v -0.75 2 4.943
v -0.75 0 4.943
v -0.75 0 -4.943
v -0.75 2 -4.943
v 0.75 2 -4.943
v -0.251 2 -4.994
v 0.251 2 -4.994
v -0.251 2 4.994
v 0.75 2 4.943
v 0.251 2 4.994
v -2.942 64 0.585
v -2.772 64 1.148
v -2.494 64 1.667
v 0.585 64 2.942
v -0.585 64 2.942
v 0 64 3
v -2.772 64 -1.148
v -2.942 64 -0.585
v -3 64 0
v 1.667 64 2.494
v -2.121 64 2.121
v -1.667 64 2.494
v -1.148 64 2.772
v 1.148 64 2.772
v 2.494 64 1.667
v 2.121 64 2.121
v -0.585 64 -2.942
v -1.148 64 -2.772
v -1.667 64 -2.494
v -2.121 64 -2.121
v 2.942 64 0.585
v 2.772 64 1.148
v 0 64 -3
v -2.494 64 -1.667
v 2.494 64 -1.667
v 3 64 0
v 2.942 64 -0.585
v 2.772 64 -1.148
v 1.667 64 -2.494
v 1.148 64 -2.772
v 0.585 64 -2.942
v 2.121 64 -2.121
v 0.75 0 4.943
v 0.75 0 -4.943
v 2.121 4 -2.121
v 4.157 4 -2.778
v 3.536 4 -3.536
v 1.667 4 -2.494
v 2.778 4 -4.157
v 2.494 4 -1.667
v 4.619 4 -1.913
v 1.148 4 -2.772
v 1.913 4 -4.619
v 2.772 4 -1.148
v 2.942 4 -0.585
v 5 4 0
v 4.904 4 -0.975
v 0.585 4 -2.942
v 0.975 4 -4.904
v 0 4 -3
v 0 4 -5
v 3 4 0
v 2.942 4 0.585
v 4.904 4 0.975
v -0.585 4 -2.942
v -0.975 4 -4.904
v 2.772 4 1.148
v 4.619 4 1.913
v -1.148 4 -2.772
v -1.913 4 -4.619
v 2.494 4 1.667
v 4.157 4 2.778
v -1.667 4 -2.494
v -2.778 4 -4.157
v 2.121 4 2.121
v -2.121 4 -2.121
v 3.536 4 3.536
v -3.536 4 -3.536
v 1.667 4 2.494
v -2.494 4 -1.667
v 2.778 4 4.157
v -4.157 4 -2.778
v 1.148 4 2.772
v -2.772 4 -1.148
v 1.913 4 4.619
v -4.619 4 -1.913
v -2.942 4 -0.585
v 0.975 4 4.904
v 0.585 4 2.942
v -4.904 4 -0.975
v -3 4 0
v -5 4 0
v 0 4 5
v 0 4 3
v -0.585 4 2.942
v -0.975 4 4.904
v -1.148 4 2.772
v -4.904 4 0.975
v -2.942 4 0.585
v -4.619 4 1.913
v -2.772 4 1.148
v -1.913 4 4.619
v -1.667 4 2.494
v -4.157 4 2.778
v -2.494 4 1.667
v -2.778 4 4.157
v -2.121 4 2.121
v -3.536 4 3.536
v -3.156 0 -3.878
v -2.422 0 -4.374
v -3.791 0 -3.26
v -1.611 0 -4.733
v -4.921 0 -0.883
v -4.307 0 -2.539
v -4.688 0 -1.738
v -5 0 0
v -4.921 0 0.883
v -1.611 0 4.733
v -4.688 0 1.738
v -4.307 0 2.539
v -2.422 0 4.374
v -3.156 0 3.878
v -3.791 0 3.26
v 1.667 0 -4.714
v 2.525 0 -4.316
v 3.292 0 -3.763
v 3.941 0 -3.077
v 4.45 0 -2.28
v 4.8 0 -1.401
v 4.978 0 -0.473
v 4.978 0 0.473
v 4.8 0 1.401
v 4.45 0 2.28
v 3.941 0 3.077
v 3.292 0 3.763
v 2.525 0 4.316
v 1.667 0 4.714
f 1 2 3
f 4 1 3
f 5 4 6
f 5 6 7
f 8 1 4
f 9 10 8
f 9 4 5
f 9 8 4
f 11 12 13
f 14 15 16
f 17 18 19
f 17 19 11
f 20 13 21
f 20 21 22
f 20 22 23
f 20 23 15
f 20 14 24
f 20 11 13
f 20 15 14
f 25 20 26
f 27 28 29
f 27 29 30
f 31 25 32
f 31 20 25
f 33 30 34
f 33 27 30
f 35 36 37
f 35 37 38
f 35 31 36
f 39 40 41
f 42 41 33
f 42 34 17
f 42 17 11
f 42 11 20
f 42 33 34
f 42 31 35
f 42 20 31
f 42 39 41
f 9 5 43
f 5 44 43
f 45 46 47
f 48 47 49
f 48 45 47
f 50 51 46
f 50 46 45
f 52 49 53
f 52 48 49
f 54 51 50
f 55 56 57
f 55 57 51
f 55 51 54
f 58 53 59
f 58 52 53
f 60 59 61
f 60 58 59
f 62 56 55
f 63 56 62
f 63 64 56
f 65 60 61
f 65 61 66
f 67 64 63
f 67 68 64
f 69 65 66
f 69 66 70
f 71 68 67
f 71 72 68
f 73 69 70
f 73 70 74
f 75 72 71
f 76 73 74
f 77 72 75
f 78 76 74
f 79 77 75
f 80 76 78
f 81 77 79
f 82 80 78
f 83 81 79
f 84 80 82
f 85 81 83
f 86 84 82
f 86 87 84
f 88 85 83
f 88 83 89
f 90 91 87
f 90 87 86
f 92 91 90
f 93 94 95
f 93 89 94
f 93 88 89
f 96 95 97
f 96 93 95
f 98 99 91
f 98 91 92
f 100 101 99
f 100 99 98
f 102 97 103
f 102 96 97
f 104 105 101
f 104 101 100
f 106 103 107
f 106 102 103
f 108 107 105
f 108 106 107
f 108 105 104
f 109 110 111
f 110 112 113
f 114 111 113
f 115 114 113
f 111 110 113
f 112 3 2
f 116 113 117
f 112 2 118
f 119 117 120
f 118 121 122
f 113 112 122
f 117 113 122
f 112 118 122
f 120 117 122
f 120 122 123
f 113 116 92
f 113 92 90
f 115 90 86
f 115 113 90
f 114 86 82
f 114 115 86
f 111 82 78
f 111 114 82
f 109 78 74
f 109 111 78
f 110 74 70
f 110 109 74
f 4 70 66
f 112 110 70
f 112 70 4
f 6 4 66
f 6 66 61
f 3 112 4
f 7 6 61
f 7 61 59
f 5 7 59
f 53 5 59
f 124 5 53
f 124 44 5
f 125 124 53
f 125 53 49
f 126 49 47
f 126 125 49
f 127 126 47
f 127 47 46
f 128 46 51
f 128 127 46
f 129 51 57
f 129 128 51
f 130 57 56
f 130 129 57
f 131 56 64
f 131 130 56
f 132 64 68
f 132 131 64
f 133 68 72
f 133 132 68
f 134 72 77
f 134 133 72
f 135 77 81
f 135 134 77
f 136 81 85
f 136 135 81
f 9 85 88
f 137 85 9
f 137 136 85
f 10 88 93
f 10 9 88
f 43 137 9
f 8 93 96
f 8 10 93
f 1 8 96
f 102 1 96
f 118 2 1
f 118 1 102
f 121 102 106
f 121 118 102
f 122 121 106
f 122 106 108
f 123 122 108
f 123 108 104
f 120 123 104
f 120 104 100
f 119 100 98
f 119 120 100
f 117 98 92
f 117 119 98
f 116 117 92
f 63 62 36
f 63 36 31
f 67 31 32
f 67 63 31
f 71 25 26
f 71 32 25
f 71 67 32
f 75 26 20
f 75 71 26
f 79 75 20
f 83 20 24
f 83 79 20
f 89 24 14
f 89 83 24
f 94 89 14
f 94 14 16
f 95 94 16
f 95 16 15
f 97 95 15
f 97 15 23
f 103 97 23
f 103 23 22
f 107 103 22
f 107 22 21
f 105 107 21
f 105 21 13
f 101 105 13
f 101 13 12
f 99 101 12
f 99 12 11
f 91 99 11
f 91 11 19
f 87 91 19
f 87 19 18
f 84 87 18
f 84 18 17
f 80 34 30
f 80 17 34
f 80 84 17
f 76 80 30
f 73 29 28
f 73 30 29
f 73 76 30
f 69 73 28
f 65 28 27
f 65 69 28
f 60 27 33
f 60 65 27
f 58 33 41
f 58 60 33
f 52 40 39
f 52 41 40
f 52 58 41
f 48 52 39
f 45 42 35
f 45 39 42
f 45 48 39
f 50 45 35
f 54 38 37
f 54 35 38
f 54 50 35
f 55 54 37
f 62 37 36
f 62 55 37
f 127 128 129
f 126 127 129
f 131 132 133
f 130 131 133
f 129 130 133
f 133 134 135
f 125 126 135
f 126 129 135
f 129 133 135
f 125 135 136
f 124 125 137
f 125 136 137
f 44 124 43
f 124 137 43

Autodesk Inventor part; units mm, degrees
ref_plane "YZ Plane" through (0, 0, 0) normal (1, 0, 0) x (0, 1, 0)
ref_plane "XZ Plane" through (0, 0, 0) normal (0, 1, 0) x (-1, 0, 0)
ref_plane "XY Plane" through (0, 0, 0) normal (0, 0, 1) x (1, 0, 0)
sketch "Sketch1" plane through (0, 0, 0) normal (0, 1, 0) x (-1, 0, 0)
  circle A0 centre (0, 0) radius 5
  dimension "d0" = 10
extrude "Extrusion1" add sketch "Sketch1" along normal blind 4
sketch "Sketch2" plane through (0, 4, 0) normal (0, 1, 0) x (1, 0, 0)
  circle A0 centre (0, 0) radius 3
  dimension "d3" = 6
extrude "Extrusion2" add sketch "Sketch2" along normal blind 60
thread "Thread1" size "M6x1" class "6g" standard "ANSI Metric M Profile" full length
sketch "Sketch3" plane through (0, 0, 0) normal (0, -1, 0) x (1, 0, 0)
  line L0 (-0.75, -10) -> (0.75, -10)
  line L1 (0.75, -10) -> (0.75, 10)
  line L2 (0.75, 10) -> (-0.75, 10)
  line L3 (-0.75, 10) -> (-0.75, -10)
  circle A0 centre (0, 0) radius 3 projected
  line L4 (-0.75, -10) -> (0.75, 10) construction
  line L5 (0.75, -10) -> (-0.75, 10) construction
  dimension "d8" = 1.5
  dimension "d9" = 20
extrude "Extrusion3" cut sketch "Sketch3" against normal blind 2 contours L3 A0 L1 L0 | L3 A0 L1 | L3 L2 L1 A0
properties part number "vijs"
